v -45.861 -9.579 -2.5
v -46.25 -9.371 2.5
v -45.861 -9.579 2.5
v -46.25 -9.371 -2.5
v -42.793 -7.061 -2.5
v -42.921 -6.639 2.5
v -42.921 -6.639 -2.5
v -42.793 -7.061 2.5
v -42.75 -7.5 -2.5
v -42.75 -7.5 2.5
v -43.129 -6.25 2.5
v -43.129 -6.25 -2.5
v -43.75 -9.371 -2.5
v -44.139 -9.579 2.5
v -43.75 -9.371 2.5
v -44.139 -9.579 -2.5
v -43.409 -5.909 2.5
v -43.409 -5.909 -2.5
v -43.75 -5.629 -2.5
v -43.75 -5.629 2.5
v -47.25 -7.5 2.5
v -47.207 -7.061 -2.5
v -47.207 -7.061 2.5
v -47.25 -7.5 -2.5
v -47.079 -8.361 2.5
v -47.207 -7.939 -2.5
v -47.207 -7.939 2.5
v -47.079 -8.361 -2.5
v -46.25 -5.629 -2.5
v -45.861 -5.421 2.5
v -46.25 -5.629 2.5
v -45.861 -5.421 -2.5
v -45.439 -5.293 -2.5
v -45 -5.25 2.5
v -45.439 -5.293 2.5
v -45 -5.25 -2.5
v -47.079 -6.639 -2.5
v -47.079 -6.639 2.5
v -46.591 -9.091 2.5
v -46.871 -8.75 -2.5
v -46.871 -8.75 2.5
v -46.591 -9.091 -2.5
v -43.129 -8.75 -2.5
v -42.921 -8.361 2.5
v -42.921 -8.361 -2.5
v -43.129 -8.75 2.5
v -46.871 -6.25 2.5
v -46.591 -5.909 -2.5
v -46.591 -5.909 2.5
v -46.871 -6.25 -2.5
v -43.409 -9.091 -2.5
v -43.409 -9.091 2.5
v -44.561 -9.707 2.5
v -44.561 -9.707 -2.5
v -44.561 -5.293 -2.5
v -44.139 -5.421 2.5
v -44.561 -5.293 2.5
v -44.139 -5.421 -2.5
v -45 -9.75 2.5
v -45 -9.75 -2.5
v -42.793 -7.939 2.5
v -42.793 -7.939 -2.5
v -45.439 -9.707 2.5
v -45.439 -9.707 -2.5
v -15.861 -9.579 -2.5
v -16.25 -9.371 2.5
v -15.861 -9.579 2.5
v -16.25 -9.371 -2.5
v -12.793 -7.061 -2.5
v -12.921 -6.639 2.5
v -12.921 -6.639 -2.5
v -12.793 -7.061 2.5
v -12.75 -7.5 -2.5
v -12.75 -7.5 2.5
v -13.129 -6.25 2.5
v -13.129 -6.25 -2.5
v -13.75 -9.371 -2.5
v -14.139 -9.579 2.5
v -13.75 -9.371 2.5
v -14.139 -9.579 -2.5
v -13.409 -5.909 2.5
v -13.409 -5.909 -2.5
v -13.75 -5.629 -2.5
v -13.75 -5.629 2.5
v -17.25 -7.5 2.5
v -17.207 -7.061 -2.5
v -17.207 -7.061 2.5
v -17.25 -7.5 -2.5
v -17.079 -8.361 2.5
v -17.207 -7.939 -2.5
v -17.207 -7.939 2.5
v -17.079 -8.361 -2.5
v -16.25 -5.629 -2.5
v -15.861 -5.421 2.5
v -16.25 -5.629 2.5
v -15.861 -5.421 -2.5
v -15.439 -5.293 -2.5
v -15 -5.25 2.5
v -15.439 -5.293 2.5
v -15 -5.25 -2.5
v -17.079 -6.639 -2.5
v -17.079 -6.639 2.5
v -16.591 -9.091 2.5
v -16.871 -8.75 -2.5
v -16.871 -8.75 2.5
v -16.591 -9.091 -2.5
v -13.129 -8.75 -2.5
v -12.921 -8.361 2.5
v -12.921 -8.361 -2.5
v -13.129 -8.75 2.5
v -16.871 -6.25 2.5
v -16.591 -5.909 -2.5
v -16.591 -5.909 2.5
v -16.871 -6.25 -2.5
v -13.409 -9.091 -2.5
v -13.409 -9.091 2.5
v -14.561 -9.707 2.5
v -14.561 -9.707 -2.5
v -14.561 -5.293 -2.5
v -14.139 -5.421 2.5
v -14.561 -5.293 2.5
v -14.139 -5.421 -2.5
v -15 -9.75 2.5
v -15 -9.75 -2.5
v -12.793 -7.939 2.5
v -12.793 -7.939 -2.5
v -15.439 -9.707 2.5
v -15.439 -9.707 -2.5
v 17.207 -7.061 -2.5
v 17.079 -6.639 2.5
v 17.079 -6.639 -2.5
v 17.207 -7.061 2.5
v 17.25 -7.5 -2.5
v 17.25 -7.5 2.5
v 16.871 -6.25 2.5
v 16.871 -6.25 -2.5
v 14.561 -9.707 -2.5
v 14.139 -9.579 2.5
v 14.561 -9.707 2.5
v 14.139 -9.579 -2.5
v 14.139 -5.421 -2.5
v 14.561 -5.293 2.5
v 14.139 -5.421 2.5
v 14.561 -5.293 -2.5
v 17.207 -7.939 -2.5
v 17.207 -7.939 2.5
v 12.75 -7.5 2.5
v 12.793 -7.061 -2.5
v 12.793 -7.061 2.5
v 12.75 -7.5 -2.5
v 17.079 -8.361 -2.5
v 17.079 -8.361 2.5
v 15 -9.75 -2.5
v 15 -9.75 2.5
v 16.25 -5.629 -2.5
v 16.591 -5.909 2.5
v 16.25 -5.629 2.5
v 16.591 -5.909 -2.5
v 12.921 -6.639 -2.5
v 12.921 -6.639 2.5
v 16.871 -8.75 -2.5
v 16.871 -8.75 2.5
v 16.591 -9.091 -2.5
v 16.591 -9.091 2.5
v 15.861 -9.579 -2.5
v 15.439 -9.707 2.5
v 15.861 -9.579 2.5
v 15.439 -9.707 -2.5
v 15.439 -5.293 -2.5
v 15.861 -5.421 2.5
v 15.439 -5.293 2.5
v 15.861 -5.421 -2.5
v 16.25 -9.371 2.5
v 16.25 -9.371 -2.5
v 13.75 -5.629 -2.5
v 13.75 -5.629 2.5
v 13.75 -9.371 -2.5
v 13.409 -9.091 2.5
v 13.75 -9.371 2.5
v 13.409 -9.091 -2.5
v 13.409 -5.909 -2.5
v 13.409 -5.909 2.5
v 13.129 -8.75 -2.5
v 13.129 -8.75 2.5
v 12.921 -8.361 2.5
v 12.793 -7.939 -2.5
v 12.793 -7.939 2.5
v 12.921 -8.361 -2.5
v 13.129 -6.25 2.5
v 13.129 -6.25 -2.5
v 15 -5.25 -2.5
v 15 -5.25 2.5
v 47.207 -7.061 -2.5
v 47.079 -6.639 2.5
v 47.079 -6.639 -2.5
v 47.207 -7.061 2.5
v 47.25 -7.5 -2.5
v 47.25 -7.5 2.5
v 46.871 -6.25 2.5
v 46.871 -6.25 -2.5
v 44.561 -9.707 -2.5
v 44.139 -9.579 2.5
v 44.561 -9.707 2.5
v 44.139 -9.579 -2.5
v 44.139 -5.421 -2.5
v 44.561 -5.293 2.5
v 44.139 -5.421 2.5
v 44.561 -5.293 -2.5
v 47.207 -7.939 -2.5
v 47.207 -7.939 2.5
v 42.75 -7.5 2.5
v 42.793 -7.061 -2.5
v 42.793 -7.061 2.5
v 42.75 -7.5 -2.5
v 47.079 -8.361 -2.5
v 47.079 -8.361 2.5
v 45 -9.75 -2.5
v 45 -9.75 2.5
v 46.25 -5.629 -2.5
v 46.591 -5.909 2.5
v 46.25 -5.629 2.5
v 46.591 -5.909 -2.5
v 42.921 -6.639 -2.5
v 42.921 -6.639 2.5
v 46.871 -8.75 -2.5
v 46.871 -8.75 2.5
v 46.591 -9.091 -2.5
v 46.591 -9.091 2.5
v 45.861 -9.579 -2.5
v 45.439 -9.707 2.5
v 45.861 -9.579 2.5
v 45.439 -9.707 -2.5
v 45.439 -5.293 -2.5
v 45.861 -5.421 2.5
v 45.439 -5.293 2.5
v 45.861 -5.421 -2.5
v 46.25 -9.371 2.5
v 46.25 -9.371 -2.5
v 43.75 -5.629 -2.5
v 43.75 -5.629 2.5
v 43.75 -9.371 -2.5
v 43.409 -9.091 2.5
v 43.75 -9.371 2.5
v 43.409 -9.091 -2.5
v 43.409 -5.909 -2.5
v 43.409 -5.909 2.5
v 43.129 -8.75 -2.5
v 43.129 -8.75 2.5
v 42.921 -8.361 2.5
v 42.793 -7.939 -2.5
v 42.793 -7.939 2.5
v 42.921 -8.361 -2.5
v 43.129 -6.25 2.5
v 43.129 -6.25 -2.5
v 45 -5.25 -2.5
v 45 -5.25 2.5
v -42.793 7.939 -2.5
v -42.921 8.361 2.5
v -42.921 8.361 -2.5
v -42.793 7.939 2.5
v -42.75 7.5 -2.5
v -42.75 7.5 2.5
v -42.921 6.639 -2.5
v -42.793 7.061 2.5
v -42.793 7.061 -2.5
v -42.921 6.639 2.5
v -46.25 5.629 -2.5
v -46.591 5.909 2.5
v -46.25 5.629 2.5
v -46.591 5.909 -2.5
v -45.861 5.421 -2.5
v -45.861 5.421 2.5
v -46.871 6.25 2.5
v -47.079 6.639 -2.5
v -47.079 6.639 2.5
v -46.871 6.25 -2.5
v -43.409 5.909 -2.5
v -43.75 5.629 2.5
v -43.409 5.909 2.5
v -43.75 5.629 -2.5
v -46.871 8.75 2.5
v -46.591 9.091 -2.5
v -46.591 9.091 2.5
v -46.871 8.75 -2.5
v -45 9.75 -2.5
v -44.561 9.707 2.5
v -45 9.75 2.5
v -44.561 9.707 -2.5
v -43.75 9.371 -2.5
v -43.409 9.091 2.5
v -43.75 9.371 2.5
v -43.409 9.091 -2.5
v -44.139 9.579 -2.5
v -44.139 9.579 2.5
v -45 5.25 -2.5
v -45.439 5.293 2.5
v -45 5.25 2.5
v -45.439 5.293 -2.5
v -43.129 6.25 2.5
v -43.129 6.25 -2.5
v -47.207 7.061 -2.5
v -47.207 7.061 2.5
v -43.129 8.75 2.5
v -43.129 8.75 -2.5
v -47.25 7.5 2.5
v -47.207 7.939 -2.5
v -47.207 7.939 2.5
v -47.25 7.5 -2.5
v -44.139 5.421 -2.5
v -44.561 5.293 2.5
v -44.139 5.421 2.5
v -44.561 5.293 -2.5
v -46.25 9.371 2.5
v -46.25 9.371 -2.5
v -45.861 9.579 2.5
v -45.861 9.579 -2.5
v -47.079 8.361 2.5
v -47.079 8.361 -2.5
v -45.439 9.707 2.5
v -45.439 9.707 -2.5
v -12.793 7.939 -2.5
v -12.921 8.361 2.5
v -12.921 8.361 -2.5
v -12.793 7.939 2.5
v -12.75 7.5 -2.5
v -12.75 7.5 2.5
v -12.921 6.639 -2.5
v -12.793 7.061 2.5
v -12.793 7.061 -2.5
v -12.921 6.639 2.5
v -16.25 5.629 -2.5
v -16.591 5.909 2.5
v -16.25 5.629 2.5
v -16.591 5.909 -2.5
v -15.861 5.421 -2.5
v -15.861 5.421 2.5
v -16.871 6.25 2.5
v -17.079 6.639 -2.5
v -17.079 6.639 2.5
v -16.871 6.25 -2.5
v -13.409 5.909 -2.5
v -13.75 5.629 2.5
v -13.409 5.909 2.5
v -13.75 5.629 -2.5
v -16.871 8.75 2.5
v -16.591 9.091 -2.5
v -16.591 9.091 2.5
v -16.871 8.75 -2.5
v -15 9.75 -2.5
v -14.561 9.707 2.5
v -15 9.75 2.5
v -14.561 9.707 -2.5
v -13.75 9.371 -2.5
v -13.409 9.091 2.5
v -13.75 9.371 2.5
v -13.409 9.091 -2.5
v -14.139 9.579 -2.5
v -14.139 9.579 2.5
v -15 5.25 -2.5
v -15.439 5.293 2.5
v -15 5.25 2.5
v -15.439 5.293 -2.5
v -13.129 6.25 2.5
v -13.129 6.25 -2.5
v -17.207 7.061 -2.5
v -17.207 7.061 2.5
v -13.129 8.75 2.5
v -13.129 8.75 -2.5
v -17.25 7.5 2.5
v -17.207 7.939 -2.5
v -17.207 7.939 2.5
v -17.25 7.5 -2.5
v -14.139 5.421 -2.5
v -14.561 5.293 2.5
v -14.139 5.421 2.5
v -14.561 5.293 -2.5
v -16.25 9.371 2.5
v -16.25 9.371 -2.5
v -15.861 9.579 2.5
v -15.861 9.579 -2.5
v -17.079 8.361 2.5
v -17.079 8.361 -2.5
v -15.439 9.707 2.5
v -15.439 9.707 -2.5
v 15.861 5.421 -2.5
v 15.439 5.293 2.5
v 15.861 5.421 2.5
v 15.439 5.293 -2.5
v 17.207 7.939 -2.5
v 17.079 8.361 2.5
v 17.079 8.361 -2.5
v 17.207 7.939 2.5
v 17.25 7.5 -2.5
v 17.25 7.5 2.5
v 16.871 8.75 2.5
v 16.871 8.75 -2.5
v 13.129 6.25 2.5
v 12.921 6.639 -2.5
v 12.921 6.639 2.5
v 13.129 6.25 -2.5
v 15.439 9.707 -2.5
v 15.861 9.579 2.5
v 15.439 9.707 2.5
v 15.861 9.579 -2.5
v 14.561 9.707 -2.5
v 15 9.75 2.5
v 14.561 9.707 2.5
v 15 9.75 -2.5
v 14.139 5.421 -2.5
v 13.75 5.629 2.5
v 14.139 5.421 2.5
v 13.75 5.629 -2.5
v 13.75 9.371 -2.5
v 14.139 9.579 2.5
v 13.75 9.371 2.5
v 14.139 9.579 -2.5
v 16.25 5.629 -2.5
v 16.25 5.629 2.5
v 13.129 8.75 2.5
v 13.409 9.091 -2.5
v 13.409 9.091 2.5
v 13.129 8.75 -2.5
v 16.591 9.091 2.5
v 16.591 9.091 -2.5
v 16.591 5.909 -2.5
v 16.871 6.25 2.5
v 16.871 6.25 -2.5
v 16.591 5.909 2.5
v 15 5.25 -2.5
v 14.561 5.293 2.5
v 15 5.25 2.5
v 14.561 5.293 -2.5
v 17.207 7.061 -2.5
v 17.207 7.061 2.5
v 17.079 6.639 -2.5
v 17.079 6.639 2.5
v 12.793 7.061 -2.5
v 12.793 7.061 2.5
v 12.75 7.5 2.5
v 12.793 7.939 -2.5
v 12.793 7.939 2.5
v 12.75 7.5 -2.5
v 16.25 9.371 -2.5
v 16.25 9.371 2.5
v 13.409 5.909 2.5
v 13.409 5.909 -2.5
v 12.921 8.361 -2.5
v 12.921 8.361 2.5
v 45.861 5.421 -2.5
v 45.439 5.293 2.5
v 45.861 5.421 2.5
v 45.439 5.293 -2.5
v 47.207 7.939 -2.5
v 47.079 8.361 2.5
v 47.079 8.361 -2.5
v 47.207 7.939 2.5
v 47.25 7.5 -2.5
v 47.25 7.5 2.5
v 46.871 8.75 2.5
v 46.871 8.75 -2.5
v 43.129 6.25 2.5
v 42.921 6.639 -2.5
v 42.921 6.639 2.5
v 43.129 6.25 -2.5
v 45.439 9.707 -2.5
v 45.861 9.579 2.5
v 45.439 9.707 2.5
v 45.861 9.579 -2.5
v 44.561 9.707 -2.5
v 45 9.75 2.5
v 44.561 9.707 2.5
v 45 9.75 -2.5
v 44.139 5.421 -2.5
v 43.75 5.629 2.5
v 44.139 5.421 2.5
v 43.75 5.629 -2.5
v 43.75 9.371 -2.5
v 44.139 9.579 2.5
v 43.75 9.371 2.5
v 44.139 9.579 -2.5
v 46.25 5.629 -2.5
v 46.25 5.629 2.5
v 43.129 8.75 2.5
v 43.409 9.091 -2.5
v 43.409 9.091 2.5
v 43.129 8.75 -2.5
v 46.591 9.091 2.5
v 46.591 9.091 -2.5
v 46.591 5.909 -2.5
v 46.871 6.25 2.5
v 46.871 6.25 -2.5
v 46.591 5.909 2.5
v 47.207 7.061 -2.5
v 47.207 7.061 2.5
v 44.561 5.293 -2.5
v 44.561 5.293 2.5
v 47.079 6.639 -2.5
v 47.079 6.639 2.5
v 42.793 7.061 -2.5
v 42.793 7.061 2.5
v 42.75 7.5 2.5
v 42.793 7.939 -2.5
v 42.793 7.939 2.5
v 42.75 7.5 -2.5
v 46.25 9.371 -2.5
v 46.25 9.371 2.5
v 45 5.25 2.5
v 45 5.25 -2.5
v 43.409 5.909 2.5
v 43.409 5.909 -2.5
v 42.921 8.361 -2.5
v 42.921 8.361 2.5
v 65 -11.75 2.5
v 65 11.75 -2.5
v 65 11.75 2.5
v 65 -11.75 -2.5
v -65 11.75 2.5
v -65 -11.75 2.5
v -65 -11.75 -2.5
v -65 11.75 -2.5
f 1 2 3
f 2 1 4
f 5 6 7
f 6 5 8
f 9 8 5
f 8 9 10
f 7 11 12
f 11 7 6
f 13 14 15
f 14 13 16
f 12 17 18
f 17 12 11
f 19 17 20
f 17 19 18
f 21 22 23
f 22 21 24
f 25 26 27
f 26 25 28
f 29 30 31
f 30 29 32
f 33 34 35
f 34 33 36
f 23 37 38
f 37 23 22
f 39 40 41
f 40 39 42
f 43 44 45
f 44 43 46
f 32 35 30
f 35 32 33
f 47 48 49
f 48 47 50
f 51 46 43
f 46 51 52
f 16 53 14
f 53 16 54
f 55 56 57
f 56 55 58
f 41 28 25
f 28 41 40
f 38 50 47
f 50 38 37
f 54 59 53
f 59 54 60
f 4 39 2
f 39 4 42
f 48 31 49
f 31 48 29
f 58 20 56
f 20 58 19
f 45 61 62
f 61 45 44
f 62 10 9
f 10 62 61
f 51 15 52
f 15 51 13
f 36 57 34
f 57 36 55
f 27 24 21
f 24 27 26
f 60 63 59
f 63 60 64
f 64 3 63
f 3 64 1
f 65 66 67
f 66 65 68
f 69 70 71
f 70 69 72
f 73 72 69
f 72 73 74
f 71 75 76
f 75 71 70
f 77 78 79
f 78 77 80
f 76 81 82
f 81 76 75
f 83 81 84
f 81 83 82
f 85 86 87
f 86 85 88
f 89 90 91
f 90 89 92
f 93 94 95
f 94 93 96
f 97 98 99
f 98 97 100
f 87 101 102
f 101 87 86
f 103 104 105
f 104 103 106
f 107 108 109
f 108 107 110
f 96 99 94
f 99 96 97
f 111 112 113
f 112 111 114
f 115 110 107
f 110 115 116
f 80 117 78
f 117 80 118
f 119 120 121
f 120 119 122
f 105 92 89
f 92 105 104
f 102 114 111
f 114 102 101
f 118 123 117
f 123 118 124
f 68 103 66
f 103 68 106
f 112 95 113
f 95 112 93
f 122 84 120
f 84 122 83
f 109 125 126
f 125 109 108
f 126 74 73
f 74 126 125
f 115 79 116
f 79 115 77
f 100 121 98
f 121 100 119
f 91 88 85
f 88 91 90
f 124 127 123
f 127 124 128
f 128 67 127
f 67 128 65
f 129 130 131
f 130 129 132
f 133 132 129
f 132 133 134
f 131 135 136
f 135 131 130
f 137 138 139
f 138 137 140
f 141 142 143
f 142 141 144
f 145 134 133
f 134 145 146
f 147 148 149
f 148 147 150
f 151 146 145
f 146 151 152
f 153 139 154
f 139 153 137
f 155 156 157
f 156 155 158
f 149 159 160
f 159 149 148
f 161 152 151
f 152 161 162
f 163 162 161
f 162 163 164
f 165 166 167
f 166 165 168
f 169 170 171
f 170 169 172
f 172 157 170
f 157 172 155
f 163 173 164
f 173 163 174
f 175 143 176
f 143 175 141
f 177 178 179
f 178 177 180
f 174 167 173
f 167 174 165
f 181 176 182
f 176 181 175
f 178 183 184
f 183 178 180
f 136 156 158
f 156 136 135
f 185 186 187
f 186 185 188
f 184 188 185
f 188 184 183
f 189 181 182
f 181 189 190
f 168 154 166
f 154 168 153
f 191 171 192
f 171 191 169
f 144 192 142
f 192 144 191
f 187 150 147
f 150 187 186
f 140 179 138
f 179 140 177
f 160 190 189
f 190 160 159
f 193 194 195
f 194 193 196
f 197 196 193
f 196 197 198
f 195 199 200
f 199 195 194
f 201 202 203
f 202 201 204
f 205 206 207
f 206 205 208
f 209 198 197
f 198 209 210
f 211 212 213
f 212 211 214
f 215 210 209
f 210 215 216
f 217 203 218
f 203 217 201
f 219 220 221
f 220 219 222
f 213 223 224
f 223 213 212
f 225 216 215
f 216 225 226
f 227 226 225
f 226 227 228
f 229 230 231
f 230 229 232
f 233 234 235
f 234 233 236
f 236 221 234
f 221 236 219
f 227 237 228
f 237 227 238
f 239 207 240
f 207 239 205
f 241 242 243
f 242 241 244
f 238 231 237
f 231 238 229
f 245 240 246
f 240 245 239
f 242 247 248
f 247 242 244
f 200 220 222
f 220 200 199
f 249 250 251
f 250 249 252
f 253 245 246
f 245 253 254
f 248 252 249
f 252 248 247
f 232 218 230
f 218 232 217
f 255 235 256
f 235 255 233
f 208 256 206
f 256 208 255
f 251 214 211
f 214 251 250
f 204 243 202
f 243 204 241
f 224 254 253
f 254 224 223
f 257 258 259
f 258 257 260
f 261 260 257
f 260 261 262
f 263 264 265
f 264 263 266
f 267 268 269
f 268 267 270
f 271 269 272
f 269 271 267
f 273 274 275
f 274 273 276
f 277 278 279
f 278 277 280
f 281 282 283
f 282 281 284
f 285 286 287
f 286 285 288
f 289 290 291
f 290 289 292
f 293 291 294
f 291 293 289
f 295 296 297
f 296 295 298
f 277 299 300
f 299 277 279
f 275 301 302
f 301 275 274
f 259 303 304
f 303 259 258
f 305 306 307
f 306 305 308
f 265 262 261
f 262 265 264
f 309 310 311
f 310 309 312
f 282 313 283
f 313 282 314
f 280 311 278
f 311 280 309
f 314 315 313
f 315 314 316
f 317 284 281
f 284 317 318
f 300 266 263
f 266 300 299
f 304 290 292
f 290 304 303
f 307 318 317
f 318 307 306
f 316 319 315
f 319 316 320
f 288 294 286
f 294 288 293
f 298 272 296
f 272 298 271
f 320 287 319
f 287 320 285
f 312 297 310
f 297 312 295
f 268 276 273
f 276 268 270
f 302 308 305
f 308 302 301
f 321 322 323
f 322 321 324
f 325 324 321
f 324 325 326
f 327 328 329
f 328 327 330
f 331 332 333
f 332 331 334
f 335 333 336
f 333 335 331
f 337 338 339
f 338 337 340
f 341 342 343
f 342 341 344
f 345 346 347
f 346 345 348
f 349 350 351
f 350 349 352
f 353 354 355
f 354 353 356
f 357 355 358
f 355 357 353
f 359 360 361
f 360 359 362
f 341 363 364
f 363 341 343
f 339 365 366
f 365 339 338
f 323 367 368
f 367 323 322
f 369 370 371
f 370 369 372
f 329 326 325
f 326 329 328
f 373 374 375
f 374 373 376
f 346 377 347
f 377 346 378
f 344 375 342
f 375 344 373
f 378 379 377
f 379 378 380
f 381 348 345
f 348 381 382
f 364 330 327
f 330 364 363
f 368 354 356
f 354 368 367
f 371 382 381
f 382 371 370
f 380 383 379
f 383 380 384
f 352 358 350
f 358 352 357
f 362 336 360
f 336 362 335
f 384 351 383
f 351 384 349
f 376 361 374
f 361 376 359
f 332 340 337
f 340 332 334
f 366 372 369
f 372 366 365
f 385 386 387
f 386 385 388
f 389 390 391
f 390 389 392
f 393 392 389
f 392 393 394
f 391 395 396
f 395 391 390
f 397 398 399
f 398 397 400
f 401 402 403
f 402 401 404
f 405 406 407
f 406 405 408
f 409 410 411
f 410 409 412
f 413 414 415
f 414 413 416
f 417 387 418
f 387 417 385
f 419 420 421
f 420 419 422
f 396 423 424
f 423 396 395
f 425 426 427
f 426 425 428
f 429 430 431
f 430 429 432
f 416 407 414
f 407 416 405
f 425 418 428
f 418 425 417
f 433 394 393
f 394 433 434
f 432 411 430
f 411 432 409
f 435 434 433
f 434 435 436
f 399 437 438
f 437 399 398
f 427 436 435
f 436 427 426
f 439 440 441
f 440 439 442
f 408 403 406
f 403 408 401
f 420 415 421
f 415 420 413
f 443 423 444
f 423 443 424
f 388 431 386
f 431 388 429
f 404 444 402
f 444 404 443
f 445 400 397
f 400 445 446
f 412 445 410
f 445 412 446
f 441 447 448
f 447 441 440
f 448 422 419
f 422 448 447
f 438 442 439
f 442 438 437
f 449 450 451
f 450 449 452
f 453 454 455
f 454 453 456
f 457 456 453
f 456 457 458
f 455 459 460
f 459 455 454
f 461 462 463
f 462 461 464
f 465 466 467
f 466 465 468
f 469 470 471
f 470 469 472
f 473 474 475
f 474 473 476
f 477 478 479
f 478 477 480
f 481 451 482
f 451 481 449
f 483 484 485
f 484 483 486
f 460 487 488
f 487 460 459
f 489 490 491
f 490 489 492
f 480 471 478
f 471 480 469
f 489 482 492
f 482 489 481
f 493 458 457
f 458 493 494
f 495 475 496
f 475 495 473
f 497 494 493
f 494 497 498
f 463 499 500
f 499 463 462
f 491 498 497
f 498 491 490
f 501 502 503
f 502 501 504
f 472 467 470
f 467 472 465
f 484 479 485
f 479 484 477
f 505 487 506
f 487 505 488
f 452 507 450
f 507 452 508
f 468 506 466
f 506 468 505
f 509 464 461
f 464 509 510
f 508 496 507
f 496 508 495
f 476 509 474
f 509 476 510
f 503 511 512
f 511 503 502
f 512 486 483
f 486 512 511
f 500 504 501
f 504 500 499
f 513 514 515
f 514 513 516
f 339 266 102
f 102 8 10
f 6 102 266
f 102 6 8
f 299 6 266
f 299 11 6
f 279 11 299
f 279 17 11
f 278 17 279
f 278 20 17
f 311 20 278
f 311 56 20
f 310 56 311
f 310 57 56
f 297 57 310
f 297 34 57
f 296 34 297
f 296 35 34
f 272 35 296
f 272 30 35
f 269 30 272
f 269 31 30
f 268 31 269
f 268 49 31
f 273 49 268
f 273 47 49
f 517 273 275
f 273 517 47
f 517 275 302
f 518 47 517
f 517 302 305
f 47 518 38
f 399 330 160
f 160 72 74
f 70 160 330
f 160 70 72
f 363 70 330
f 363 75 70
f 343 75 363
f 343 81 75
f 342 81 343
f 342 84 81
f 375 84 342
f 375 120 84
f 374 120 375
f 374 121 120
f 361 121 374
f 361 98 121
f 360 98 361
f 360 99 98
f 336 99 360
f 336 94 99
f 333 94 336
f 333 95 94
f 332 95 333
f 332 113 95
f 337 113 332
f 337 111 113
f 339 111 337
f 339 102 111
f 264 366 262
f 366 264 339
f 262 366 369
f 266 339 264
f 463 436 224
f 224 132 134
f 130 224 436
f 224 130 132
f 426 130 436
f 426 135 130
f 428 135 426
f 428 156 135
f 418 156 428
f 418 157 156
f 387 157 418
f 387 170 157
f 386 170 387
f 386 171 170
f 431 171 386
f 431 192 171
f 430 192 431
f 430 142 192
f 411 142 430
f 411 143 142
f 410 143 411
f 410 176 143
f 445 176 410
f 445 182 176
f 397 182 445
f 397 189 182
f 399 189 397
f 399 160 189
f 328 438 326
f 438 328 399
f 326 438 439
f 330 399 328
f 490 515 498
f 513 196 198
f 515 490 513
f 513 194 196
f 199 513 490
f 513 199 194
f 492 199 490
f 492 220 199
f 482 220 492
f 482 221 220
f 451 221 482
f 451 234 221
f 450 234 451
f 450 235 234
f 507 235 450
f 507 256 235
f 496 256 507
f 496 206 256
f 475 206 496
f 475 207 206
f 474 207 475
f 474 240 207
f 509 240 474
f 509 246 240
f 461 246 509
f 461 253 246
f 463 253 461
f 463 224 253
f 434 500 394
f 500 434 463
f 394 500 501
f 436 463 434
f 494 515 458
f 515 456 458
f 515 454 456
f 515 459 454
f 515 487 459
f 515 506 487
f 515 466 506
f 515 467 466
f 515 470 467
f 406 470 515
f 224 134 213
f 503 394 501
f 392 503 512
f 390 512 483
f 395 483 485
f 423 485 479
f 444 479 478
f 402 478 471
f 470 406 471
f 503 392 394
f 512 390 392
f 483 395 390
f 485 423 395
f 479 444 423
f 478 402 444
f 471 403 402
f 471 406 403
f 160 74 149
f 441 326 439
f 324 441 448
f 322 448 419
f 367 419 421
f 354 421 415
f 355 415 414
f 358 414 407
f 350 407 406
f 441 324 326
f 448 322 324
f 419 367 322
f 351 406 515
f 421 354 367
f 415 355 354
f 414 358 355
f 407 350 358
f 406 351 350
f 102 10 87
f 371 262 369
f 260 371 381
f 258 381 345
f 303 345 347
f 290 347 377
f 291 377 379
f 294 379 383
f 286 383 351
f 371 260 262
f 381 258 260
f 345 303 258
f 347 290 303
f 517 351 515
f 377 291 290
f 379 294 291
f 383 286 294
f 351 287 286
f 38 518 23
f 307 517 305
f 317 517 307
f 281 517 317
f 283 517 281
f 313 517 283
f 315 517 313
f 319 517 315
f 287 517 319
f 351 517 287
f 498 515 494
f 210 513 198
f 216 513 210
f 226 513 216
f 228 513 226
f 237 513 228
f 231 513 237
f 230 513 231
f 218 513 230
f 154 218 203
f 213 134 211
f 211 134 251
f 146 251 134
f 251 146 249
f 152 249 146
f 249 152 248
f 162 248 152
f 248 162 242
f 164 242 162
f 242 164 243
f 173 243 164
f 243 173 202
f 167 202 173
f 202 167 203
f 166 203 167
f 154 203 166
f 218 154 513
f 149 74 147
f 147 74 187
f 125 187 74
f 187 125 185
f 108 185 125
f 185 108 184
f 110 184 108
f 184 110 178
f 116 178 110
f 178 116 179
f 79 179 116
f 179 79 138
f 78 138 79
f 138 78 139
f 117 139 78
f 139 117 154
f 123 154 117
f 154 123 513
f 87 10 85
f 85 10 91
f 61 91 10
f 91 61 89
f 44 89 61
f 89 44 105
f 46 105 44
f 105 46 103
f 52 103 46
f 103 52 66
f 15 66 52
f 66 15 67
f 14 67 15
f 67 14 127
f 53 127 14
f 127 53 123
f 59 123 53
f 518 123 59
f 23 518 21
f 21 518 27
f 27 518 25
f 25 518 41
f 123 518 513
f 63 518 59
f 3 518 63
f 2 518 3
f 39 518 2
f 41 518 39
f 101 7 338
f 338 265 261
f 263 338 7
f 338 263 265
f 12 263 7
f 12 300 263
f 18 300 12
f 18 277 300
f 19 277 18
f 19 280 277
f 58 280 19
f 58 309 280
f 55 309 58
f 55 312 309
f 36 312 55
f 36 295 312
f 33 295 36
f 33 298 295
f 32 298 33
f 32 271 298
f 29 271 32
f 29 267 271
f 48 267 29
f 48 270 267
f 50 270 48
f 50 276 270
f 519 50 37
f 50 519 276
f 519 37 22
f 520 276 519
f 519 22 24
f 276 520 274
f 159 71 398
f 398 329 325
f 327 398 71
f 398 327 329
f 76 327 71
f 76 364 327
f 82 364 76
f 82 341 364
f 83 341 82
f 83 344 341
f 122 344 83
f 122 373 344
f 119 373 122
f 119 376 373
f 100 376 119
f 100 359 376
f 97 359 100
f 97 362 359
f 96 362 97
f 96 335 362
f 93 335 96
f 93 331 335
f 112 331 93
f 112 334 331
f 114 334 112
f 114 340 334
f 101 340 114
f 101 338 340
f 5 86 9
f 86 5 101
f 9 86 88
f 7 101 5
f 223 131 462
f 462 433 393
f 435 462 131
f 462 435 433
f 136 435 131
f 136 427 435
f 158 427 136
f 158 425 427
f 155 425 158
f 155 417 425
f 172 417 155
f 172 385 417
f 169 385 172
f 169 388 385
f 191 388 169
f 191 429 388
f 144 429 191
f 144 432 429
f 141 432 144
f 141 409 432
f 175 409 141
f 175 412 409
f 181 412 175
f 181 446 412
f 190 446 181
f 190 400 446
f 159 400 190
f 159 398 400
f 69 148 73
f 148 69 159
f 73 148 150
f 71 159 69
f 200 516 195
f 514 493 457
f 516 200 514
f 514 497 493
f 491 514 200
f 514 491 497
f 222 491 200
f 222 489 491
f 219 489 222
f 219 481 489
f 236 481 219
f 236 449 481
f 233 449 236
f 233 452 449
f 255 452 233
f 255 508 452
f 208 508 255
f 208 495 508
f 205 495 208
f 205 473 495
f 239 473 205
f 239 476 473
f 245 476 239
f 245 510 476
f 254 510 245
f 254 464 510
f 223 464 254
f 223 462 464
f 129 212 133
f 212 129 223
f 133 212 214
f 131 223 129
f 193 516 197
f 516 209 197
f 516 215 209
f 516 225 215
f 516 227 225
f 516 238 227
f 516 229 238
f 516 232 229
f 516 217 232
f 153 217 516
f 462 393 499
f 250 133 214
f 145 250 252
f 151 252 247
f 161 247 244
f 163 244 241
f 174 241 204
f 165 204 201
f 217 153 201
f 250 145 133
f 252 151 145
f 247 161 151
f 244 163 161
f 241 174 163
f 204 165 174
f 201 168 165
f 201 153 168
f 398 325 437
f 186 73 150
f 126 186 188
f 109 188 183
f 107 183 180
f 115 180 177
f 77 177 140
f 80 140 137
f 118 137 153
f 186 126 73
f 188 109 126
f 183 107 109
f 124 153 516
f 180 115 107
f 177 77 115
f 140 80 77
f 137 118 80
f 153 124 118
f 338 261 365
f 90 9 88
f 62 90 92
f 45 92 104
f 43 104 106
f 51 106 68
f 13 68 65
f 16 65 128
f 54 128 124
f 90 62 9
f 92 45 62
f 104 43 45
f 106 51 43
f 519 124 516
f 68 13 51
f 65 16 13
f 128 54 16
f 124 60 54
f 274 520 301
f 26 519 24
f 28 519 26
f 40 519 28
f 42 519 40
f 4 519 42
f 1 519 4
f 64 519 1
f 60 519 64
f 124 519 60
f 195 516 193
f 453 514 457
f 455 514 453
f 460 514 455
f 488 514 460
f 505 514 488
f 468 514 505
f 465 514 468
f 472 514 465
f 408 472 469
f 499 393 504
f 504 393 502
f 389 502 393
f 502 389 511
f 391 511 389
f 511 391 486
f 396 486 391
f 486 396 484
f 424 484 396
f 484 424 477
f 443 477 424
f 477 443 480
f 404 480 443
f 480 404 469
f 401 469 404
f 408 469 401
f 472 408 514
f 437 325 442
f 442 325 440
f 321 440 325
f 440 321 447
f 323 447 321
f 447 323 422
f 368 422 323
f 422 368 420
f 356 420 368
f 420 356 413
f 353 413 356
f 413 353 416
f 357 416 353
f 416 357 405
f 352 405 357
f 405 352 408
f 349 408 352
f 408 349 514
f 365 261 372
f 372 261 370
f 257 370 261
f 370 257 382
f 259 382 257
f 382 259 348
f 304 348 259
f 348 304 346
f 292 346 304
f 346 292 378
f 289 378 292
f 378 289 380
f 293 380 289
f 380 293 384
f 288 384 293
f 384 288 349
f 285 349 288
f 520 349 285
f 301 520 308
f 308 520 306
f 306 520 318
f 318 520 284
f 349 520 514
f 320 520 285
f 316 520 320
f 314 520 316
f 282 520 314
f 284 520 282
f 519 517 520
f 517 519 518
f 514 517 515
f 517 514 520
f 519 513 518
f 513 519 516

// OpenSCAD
$fn = 32;

// ----------------------------------------------------------------------
// Hole bar, 4 x Ø4.5
// tworows layout, 20 mm edge offset
// ----------------------------------------------------------------------

// --- parameters (mm) ---
bar_w = 23.5;     // bar width (Y)
bar_t = 5;        // bar thickness (Z)
holes = 4;        // holes per row
hole_d = 4.5;     // hole diameter
edge = 20;        // offset from the bar end to the first hole
pitch = 30;       // pitch between neighbouring holes
row_offset = 15;  // distance between the two rows

// --- derived feature positions (mm) ---
span = (holes - 1) * pitch;   // = 90   distance between the end holes
bar_l = span + 2 * edge;      // = 130   overall bar length
start_x = -bar_l / 2 + edge;  // = -45   X of the first hole
feature_centers = [
  [start_x + 0 * pitch, -row_offset / 2],
  [start_x + 1 * pitch, -row_offset / 2],
  [start_x + 2 * pitch, -row_offset / 2],
  [start_x + 3 * pitch, -row_offset / 2]
];   // hole centres of the first row
row2_centers = [
  [start_x + 0 * pitch, row_offset / 2],
  [start_x + 1 * pitch, row_offset / 2],
  [start_x + 2 * pitch, row_offset / 2],
  [start_x + 3 * pitch, row_offset / 2]
];   // hole centres of the second row

// bar with two rows of holes, both read from their own centre arrays
difference() {
  translate([-bar_l / 2, -bar_w / 2, -bar_t / 2]) cube([bar_l, bar_w, bar_t]);
  for (centre = feature_centers)
    translate([centre[0], centre[1], 0])
      cylinder(d = hole_d, h = bar_t + 2, center = true);
  for (centre = row2_centers)
    translate([centre[0], centre[1], 0])
      cylinder(d = hole_d, h = bar_t + 2, center = true);
}
